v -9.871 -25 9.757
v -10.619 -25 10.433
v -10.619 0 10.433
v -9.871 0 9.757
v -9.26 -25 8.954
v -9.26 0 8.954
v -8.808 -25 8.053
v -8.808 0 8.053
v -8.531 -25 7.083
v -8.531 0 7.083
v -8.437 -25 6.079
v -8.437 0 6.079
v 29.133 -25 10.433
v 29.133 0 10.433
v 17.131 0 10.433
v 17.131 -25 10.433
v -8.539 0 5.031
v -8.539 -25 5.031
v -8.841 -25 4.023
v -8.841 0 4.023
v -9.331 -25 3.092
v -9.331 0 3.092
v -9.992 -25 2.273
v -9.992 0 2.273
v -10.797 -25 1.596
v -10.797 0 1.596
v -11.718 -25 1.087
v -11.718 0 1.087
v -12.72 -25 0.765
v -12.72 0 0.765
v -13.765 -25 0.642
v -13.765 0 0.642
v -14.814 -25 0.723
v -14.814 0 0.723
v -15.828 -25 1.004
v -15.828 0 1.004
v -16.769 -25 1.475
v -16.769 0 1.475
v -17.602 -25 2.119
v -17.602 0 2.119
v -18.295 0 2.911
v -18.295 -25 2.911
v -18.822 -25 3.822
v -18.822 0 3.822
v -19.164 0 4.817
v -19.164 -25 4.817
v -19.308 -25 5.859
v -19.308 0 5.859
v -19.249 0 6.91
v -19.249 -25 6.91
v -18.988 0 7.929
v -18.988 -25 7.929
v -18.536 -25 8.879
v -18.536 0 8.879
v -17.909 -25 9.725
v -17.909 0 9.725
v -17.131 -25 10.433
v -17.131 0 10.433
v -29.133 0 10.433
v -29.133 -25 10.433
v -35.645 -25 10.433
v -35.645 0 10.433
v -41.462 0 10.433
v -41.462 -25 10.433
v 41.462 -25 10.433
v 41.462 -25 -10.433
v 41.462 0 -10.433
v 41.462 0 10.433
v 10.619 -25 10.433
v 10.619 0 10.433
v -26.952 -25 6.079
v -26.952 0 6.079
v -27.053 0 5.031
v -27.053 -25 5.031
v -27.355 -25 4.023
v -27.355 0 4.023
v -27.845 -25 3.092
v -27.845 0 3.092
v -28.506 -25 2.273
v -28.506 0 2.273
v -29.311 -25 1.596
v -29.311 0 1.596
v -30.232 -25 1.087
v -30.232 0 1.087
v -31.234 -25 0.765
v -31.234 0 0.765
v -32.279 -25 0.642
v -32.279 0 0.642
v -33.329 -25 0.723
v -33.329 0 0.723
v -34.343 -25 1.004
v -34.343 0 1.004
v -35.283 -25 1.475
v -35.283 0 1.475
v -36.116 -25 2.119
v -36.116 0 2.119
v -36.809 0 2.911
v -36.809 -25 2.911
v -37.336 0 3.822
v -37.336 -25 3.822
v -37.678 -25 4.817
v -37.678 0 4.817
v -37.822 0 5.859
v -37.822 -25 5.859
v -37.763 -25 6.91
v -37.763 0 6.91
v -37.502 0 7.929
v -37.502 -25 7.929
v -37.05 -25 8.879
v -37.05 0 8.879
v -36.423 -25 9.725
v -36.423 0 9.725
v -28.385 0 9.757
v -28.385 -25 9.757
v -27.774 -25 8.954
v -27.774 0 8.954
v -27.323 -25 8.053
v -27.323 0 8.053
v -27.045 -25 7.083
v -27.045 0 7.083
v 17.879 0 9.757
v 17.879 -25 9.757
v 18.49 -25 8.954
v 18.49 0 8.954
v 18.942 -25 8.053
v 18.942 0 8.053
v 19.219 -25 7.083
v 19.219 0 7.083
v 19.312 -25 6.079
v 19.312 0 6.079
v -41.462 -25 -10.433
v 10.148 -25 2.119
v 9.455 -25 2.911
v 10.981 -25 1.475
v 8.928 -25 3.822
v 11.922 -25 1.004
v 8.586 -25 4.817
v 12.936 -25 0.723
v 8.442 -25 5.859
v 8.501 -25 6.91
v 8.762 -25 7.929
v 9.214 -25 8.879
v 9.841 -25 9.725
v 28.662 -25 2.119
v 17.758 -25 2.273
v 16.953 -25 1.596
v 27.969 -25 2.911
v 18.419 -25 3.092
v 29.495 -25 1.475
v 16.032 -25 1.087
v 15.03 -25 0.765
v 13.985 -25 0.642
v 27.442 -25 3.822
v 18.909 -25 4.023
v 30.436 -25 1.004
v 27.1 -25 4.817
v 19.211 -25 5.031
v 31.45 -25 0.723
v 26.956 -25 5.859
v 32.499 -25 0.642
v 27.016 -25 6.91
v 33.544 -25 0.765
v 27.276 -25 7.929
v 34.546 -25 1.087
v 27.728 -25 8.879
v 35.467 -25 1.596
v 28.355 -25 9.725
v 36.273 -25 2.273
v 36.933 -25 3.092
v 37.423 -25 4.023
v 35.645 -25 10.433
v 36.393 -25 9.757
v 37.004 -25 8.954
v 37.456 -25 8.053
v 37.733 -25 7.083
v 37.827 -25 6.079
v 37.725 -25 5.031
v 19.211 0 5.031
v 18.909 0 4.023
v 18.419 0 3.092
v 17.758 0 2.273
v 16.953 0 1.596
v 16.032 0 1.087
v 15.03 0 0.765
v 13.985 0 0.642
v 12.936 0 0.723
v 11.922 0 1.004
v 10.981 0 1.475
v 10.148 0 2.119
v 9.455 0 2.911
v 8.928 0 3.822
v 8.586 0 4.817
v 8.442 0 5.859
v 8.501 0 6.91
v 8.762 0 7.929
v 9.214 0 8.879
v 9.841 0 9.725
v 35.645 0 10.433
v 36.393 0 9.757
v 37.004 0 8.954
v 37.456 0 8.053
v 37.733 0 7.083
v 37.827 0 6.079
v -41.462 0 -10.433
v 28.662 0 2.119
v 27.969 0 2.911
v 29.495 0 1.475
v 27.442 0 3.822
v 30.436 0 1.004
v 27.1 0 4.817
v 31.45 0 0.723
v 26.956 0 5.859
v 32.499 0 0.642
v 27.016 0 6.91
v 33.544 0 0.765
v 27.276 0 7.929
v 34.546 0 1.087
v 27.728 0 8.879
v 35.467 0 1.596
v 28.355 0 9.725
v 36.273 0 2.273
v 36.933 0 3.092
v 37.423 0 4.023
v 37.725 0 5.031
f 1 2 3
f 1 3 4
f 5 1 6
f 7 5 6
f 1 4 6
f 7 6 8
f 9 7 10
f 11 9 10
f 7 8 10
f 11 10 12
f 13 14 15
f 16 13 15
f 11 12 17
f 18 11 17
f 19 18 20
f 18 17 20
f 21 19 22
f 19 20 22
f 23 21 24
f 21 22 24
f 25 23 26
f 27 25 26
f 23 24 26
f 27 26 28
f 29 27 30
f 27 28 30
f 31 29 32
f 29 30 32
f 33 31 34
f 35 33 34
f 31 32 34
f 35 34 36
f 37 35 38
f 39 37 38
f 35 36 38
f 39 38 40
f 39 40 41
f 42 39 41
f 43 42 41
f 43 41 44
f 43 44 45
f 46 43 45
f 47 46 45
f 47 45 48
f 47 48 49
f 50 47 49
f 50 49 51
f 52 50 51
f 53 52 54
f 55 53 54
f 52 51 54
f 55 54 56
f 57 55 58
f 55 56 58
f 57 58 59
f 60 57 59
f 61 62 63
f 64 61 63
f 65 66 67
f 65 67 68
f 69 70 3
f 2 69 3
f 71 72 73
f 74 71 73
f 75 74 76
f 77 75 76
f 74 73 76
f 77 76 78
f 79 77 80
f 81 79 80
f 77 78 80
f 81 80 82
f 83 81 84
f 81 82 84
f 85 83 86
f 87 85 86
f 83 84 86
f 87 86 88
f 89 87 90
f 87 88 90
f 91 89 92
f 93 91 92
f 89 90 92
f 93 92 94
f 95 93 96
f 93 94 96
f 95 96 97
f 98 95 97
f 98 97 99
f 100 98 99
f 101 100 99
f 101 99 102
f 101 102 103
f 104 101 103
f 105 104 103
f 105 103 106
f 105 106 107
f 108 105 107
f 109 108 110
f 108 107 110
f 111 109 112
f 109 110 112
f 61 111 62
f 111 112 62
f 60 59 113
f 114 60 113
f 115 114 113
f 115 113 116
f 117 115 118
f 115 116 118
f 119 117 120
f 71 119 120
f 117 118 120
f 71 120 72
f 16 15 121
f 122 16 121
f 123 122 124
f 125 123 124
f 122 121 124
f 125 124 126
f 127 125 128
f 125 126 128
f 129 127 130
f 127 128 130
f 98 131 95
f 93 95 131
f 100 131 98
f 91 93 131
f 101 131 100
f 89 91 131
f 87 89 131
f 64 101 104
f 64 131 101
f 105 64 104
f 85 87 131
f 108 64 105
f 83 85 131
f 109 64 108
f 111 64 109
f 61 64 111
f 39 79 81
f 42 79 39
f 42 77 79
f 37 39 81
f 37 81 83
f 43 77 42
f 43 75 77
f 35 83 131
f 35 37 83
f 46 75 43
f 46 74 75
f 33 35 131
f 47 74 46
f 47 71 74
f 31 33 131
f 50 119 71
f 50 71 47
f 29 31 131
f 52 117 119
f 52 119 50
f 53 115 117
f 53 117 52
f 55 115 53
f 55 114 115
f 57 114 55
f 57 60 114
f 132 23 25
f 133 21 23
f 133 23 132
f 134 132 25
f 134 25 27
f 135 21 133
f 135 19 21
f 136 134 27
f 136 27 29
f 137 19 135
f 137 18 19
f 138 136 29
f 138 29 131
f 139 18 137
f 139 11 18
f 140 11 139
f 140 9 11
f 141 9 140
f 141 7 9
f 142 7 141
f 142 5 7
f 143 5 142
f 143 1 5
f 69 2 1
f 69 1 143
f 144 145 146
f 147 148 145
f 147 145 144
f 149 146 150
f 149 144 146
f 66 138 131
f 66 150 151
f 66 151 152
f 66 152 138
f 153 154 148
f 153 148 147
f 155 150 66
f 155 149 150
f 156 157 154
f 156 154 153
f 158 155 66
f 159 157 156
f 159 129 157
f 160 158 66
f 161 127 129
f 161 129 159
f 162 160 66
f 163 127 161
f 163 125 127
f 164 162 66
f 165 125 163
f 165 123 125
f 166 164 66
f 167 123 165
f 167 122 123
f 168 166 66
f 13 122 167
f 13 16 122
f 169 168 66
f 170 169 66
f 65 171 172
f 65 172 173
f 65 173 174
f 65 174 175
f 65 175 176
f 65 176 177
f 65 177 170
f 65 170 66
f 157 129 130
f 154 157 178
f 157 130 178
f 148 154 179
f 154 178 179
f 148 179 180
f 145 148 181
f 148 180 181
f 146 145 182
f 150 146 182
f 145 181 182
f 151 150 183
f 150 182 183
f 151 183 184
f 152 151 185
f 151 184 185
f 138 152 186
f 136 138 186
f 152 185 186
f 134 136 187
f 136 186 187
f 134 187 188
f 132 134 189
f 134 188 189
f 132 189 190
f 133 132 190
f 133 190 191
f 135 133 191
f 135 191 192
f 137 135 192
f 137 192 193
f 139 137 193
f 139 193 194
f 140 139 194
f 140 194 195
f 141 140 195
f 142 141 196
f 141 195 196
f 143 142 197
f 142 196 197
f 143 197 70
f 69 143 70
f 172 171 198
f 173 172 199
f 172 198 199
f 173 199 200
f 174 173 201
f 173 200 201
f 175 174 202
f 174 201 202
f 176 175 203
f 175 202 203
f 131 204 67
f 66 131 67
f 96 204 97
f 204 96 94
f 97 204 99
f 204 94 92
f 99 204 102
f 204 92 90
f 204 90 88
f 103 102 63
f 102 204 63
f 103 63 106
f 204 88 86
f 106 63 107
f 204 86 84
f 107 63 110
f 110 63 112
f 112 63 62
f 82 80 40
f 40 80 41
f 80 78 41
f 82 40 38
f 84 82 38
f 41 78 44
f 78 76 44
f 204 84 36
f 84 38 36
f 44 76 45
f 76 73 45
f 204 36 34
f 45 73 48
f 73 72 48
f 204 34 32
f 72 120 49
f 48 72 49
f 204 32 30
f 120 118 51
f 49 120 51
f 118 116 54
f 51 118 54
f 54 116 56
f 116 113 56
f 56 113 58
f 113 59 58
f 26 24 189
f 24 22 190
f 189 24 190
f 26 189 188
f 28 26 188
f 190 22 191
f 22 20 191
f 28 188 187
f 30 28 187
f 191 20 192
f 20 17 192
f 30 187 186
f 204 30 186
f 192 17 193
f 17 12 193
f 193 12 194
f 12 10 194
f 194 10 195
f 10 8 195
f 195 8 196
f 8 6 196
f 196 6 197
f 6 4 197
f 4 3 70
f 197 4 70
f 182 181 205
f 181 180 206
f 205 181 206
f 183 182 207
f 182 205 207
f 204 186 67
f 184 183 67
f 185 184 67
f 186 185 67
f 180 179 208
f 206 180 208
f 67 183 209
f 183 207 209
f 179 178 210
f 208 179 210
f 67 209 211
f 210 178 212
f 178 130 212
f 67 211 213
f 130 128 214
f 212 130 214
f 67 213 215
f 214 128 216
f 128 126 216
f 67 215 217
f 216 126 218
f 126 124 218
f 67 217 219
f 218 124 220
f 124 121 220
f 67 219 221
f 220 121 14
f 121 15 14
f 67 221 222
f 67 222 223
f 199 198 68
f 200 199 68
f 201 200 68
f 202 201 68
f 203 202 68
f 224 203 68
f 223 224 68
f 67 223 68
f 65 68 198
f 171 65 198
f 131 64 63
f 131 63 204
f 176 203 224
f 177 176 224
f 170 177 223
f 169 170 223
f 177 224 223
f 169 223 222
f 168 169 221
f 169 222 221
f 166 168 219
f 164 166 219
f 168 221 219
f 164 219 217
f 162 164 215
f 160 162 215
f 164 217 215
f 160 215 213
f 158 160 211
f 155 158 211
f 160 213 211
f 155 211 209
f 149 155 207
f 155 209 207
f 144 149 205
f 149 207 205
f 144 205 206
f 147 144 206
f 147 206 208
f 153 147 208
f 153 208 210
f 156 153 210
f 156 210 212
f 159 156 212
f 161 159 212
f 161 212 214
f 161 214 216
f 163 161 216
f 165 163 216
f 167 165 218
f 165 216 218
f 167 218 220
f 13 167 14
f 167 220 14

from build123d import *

# Parameters (mm, degrees)
F1_DEPTH = 25


with BuildPart() as f1:
    # F0 (on Front) → F1 (new body)
    with BuildSketch(Plane.XZ):
        with BuildLine():
            Line((-41.461691, -10.433468), (41.461691, -10.433468))
            Line((41.461691, -10.433468), (41.461691, 10.433468))
            Line((41.461691, 10.433468), (35.64515, 10.433468))
            ThreePointArc((35.64515, 10.433468), (37.250754, 8.513963), (37.826613, 6.078629))
            ThreePointArc((37.826613, 6.078629), (29.953782, 1.216991), (29.133081, 10.433468))
            Line((29.133081, 10.433468), (17.131031, 10.433468))
            ThreePointArc((17.131031, 10.433468), (18.736635, 8.513963), (19.312494, 6.078629))
            ThreePointArc((19.312494, 6.078629), (11.439663, 1.216991), (10.618963, 10.433468))
            Line((10.618963, 10.433468), (-10.618963, 10.433468))
            ThreePointArc((-10.618963, 10.433468), (-9.013358, 8.513963), (-8.437499, 6.078629))
            ThreePointArc((-8.437499, 6.078629), (-16.310331, 1.216991), (-17.131031, 10.433468))
            Line((-17.131031, 10.433468), (-29.133081, 10.433468))
            ThreePointArc((-29.133081, 10.433468), (-27.527477, 8.513963), (-26.951618, 6.078629))
            ThreePointArc((-26.951618, 6.078629), (-34.824449, 1.216991), (-35.64515, 10.433468))
            Line((-35.64515, 10.433468), (-41.461691, 10.433468))
            Line((-41.461691, 10.433468), (-41.461691, -10.433468))
        make_face()
    extrude(amount=F1_DEPTH)


solid = f1.part
